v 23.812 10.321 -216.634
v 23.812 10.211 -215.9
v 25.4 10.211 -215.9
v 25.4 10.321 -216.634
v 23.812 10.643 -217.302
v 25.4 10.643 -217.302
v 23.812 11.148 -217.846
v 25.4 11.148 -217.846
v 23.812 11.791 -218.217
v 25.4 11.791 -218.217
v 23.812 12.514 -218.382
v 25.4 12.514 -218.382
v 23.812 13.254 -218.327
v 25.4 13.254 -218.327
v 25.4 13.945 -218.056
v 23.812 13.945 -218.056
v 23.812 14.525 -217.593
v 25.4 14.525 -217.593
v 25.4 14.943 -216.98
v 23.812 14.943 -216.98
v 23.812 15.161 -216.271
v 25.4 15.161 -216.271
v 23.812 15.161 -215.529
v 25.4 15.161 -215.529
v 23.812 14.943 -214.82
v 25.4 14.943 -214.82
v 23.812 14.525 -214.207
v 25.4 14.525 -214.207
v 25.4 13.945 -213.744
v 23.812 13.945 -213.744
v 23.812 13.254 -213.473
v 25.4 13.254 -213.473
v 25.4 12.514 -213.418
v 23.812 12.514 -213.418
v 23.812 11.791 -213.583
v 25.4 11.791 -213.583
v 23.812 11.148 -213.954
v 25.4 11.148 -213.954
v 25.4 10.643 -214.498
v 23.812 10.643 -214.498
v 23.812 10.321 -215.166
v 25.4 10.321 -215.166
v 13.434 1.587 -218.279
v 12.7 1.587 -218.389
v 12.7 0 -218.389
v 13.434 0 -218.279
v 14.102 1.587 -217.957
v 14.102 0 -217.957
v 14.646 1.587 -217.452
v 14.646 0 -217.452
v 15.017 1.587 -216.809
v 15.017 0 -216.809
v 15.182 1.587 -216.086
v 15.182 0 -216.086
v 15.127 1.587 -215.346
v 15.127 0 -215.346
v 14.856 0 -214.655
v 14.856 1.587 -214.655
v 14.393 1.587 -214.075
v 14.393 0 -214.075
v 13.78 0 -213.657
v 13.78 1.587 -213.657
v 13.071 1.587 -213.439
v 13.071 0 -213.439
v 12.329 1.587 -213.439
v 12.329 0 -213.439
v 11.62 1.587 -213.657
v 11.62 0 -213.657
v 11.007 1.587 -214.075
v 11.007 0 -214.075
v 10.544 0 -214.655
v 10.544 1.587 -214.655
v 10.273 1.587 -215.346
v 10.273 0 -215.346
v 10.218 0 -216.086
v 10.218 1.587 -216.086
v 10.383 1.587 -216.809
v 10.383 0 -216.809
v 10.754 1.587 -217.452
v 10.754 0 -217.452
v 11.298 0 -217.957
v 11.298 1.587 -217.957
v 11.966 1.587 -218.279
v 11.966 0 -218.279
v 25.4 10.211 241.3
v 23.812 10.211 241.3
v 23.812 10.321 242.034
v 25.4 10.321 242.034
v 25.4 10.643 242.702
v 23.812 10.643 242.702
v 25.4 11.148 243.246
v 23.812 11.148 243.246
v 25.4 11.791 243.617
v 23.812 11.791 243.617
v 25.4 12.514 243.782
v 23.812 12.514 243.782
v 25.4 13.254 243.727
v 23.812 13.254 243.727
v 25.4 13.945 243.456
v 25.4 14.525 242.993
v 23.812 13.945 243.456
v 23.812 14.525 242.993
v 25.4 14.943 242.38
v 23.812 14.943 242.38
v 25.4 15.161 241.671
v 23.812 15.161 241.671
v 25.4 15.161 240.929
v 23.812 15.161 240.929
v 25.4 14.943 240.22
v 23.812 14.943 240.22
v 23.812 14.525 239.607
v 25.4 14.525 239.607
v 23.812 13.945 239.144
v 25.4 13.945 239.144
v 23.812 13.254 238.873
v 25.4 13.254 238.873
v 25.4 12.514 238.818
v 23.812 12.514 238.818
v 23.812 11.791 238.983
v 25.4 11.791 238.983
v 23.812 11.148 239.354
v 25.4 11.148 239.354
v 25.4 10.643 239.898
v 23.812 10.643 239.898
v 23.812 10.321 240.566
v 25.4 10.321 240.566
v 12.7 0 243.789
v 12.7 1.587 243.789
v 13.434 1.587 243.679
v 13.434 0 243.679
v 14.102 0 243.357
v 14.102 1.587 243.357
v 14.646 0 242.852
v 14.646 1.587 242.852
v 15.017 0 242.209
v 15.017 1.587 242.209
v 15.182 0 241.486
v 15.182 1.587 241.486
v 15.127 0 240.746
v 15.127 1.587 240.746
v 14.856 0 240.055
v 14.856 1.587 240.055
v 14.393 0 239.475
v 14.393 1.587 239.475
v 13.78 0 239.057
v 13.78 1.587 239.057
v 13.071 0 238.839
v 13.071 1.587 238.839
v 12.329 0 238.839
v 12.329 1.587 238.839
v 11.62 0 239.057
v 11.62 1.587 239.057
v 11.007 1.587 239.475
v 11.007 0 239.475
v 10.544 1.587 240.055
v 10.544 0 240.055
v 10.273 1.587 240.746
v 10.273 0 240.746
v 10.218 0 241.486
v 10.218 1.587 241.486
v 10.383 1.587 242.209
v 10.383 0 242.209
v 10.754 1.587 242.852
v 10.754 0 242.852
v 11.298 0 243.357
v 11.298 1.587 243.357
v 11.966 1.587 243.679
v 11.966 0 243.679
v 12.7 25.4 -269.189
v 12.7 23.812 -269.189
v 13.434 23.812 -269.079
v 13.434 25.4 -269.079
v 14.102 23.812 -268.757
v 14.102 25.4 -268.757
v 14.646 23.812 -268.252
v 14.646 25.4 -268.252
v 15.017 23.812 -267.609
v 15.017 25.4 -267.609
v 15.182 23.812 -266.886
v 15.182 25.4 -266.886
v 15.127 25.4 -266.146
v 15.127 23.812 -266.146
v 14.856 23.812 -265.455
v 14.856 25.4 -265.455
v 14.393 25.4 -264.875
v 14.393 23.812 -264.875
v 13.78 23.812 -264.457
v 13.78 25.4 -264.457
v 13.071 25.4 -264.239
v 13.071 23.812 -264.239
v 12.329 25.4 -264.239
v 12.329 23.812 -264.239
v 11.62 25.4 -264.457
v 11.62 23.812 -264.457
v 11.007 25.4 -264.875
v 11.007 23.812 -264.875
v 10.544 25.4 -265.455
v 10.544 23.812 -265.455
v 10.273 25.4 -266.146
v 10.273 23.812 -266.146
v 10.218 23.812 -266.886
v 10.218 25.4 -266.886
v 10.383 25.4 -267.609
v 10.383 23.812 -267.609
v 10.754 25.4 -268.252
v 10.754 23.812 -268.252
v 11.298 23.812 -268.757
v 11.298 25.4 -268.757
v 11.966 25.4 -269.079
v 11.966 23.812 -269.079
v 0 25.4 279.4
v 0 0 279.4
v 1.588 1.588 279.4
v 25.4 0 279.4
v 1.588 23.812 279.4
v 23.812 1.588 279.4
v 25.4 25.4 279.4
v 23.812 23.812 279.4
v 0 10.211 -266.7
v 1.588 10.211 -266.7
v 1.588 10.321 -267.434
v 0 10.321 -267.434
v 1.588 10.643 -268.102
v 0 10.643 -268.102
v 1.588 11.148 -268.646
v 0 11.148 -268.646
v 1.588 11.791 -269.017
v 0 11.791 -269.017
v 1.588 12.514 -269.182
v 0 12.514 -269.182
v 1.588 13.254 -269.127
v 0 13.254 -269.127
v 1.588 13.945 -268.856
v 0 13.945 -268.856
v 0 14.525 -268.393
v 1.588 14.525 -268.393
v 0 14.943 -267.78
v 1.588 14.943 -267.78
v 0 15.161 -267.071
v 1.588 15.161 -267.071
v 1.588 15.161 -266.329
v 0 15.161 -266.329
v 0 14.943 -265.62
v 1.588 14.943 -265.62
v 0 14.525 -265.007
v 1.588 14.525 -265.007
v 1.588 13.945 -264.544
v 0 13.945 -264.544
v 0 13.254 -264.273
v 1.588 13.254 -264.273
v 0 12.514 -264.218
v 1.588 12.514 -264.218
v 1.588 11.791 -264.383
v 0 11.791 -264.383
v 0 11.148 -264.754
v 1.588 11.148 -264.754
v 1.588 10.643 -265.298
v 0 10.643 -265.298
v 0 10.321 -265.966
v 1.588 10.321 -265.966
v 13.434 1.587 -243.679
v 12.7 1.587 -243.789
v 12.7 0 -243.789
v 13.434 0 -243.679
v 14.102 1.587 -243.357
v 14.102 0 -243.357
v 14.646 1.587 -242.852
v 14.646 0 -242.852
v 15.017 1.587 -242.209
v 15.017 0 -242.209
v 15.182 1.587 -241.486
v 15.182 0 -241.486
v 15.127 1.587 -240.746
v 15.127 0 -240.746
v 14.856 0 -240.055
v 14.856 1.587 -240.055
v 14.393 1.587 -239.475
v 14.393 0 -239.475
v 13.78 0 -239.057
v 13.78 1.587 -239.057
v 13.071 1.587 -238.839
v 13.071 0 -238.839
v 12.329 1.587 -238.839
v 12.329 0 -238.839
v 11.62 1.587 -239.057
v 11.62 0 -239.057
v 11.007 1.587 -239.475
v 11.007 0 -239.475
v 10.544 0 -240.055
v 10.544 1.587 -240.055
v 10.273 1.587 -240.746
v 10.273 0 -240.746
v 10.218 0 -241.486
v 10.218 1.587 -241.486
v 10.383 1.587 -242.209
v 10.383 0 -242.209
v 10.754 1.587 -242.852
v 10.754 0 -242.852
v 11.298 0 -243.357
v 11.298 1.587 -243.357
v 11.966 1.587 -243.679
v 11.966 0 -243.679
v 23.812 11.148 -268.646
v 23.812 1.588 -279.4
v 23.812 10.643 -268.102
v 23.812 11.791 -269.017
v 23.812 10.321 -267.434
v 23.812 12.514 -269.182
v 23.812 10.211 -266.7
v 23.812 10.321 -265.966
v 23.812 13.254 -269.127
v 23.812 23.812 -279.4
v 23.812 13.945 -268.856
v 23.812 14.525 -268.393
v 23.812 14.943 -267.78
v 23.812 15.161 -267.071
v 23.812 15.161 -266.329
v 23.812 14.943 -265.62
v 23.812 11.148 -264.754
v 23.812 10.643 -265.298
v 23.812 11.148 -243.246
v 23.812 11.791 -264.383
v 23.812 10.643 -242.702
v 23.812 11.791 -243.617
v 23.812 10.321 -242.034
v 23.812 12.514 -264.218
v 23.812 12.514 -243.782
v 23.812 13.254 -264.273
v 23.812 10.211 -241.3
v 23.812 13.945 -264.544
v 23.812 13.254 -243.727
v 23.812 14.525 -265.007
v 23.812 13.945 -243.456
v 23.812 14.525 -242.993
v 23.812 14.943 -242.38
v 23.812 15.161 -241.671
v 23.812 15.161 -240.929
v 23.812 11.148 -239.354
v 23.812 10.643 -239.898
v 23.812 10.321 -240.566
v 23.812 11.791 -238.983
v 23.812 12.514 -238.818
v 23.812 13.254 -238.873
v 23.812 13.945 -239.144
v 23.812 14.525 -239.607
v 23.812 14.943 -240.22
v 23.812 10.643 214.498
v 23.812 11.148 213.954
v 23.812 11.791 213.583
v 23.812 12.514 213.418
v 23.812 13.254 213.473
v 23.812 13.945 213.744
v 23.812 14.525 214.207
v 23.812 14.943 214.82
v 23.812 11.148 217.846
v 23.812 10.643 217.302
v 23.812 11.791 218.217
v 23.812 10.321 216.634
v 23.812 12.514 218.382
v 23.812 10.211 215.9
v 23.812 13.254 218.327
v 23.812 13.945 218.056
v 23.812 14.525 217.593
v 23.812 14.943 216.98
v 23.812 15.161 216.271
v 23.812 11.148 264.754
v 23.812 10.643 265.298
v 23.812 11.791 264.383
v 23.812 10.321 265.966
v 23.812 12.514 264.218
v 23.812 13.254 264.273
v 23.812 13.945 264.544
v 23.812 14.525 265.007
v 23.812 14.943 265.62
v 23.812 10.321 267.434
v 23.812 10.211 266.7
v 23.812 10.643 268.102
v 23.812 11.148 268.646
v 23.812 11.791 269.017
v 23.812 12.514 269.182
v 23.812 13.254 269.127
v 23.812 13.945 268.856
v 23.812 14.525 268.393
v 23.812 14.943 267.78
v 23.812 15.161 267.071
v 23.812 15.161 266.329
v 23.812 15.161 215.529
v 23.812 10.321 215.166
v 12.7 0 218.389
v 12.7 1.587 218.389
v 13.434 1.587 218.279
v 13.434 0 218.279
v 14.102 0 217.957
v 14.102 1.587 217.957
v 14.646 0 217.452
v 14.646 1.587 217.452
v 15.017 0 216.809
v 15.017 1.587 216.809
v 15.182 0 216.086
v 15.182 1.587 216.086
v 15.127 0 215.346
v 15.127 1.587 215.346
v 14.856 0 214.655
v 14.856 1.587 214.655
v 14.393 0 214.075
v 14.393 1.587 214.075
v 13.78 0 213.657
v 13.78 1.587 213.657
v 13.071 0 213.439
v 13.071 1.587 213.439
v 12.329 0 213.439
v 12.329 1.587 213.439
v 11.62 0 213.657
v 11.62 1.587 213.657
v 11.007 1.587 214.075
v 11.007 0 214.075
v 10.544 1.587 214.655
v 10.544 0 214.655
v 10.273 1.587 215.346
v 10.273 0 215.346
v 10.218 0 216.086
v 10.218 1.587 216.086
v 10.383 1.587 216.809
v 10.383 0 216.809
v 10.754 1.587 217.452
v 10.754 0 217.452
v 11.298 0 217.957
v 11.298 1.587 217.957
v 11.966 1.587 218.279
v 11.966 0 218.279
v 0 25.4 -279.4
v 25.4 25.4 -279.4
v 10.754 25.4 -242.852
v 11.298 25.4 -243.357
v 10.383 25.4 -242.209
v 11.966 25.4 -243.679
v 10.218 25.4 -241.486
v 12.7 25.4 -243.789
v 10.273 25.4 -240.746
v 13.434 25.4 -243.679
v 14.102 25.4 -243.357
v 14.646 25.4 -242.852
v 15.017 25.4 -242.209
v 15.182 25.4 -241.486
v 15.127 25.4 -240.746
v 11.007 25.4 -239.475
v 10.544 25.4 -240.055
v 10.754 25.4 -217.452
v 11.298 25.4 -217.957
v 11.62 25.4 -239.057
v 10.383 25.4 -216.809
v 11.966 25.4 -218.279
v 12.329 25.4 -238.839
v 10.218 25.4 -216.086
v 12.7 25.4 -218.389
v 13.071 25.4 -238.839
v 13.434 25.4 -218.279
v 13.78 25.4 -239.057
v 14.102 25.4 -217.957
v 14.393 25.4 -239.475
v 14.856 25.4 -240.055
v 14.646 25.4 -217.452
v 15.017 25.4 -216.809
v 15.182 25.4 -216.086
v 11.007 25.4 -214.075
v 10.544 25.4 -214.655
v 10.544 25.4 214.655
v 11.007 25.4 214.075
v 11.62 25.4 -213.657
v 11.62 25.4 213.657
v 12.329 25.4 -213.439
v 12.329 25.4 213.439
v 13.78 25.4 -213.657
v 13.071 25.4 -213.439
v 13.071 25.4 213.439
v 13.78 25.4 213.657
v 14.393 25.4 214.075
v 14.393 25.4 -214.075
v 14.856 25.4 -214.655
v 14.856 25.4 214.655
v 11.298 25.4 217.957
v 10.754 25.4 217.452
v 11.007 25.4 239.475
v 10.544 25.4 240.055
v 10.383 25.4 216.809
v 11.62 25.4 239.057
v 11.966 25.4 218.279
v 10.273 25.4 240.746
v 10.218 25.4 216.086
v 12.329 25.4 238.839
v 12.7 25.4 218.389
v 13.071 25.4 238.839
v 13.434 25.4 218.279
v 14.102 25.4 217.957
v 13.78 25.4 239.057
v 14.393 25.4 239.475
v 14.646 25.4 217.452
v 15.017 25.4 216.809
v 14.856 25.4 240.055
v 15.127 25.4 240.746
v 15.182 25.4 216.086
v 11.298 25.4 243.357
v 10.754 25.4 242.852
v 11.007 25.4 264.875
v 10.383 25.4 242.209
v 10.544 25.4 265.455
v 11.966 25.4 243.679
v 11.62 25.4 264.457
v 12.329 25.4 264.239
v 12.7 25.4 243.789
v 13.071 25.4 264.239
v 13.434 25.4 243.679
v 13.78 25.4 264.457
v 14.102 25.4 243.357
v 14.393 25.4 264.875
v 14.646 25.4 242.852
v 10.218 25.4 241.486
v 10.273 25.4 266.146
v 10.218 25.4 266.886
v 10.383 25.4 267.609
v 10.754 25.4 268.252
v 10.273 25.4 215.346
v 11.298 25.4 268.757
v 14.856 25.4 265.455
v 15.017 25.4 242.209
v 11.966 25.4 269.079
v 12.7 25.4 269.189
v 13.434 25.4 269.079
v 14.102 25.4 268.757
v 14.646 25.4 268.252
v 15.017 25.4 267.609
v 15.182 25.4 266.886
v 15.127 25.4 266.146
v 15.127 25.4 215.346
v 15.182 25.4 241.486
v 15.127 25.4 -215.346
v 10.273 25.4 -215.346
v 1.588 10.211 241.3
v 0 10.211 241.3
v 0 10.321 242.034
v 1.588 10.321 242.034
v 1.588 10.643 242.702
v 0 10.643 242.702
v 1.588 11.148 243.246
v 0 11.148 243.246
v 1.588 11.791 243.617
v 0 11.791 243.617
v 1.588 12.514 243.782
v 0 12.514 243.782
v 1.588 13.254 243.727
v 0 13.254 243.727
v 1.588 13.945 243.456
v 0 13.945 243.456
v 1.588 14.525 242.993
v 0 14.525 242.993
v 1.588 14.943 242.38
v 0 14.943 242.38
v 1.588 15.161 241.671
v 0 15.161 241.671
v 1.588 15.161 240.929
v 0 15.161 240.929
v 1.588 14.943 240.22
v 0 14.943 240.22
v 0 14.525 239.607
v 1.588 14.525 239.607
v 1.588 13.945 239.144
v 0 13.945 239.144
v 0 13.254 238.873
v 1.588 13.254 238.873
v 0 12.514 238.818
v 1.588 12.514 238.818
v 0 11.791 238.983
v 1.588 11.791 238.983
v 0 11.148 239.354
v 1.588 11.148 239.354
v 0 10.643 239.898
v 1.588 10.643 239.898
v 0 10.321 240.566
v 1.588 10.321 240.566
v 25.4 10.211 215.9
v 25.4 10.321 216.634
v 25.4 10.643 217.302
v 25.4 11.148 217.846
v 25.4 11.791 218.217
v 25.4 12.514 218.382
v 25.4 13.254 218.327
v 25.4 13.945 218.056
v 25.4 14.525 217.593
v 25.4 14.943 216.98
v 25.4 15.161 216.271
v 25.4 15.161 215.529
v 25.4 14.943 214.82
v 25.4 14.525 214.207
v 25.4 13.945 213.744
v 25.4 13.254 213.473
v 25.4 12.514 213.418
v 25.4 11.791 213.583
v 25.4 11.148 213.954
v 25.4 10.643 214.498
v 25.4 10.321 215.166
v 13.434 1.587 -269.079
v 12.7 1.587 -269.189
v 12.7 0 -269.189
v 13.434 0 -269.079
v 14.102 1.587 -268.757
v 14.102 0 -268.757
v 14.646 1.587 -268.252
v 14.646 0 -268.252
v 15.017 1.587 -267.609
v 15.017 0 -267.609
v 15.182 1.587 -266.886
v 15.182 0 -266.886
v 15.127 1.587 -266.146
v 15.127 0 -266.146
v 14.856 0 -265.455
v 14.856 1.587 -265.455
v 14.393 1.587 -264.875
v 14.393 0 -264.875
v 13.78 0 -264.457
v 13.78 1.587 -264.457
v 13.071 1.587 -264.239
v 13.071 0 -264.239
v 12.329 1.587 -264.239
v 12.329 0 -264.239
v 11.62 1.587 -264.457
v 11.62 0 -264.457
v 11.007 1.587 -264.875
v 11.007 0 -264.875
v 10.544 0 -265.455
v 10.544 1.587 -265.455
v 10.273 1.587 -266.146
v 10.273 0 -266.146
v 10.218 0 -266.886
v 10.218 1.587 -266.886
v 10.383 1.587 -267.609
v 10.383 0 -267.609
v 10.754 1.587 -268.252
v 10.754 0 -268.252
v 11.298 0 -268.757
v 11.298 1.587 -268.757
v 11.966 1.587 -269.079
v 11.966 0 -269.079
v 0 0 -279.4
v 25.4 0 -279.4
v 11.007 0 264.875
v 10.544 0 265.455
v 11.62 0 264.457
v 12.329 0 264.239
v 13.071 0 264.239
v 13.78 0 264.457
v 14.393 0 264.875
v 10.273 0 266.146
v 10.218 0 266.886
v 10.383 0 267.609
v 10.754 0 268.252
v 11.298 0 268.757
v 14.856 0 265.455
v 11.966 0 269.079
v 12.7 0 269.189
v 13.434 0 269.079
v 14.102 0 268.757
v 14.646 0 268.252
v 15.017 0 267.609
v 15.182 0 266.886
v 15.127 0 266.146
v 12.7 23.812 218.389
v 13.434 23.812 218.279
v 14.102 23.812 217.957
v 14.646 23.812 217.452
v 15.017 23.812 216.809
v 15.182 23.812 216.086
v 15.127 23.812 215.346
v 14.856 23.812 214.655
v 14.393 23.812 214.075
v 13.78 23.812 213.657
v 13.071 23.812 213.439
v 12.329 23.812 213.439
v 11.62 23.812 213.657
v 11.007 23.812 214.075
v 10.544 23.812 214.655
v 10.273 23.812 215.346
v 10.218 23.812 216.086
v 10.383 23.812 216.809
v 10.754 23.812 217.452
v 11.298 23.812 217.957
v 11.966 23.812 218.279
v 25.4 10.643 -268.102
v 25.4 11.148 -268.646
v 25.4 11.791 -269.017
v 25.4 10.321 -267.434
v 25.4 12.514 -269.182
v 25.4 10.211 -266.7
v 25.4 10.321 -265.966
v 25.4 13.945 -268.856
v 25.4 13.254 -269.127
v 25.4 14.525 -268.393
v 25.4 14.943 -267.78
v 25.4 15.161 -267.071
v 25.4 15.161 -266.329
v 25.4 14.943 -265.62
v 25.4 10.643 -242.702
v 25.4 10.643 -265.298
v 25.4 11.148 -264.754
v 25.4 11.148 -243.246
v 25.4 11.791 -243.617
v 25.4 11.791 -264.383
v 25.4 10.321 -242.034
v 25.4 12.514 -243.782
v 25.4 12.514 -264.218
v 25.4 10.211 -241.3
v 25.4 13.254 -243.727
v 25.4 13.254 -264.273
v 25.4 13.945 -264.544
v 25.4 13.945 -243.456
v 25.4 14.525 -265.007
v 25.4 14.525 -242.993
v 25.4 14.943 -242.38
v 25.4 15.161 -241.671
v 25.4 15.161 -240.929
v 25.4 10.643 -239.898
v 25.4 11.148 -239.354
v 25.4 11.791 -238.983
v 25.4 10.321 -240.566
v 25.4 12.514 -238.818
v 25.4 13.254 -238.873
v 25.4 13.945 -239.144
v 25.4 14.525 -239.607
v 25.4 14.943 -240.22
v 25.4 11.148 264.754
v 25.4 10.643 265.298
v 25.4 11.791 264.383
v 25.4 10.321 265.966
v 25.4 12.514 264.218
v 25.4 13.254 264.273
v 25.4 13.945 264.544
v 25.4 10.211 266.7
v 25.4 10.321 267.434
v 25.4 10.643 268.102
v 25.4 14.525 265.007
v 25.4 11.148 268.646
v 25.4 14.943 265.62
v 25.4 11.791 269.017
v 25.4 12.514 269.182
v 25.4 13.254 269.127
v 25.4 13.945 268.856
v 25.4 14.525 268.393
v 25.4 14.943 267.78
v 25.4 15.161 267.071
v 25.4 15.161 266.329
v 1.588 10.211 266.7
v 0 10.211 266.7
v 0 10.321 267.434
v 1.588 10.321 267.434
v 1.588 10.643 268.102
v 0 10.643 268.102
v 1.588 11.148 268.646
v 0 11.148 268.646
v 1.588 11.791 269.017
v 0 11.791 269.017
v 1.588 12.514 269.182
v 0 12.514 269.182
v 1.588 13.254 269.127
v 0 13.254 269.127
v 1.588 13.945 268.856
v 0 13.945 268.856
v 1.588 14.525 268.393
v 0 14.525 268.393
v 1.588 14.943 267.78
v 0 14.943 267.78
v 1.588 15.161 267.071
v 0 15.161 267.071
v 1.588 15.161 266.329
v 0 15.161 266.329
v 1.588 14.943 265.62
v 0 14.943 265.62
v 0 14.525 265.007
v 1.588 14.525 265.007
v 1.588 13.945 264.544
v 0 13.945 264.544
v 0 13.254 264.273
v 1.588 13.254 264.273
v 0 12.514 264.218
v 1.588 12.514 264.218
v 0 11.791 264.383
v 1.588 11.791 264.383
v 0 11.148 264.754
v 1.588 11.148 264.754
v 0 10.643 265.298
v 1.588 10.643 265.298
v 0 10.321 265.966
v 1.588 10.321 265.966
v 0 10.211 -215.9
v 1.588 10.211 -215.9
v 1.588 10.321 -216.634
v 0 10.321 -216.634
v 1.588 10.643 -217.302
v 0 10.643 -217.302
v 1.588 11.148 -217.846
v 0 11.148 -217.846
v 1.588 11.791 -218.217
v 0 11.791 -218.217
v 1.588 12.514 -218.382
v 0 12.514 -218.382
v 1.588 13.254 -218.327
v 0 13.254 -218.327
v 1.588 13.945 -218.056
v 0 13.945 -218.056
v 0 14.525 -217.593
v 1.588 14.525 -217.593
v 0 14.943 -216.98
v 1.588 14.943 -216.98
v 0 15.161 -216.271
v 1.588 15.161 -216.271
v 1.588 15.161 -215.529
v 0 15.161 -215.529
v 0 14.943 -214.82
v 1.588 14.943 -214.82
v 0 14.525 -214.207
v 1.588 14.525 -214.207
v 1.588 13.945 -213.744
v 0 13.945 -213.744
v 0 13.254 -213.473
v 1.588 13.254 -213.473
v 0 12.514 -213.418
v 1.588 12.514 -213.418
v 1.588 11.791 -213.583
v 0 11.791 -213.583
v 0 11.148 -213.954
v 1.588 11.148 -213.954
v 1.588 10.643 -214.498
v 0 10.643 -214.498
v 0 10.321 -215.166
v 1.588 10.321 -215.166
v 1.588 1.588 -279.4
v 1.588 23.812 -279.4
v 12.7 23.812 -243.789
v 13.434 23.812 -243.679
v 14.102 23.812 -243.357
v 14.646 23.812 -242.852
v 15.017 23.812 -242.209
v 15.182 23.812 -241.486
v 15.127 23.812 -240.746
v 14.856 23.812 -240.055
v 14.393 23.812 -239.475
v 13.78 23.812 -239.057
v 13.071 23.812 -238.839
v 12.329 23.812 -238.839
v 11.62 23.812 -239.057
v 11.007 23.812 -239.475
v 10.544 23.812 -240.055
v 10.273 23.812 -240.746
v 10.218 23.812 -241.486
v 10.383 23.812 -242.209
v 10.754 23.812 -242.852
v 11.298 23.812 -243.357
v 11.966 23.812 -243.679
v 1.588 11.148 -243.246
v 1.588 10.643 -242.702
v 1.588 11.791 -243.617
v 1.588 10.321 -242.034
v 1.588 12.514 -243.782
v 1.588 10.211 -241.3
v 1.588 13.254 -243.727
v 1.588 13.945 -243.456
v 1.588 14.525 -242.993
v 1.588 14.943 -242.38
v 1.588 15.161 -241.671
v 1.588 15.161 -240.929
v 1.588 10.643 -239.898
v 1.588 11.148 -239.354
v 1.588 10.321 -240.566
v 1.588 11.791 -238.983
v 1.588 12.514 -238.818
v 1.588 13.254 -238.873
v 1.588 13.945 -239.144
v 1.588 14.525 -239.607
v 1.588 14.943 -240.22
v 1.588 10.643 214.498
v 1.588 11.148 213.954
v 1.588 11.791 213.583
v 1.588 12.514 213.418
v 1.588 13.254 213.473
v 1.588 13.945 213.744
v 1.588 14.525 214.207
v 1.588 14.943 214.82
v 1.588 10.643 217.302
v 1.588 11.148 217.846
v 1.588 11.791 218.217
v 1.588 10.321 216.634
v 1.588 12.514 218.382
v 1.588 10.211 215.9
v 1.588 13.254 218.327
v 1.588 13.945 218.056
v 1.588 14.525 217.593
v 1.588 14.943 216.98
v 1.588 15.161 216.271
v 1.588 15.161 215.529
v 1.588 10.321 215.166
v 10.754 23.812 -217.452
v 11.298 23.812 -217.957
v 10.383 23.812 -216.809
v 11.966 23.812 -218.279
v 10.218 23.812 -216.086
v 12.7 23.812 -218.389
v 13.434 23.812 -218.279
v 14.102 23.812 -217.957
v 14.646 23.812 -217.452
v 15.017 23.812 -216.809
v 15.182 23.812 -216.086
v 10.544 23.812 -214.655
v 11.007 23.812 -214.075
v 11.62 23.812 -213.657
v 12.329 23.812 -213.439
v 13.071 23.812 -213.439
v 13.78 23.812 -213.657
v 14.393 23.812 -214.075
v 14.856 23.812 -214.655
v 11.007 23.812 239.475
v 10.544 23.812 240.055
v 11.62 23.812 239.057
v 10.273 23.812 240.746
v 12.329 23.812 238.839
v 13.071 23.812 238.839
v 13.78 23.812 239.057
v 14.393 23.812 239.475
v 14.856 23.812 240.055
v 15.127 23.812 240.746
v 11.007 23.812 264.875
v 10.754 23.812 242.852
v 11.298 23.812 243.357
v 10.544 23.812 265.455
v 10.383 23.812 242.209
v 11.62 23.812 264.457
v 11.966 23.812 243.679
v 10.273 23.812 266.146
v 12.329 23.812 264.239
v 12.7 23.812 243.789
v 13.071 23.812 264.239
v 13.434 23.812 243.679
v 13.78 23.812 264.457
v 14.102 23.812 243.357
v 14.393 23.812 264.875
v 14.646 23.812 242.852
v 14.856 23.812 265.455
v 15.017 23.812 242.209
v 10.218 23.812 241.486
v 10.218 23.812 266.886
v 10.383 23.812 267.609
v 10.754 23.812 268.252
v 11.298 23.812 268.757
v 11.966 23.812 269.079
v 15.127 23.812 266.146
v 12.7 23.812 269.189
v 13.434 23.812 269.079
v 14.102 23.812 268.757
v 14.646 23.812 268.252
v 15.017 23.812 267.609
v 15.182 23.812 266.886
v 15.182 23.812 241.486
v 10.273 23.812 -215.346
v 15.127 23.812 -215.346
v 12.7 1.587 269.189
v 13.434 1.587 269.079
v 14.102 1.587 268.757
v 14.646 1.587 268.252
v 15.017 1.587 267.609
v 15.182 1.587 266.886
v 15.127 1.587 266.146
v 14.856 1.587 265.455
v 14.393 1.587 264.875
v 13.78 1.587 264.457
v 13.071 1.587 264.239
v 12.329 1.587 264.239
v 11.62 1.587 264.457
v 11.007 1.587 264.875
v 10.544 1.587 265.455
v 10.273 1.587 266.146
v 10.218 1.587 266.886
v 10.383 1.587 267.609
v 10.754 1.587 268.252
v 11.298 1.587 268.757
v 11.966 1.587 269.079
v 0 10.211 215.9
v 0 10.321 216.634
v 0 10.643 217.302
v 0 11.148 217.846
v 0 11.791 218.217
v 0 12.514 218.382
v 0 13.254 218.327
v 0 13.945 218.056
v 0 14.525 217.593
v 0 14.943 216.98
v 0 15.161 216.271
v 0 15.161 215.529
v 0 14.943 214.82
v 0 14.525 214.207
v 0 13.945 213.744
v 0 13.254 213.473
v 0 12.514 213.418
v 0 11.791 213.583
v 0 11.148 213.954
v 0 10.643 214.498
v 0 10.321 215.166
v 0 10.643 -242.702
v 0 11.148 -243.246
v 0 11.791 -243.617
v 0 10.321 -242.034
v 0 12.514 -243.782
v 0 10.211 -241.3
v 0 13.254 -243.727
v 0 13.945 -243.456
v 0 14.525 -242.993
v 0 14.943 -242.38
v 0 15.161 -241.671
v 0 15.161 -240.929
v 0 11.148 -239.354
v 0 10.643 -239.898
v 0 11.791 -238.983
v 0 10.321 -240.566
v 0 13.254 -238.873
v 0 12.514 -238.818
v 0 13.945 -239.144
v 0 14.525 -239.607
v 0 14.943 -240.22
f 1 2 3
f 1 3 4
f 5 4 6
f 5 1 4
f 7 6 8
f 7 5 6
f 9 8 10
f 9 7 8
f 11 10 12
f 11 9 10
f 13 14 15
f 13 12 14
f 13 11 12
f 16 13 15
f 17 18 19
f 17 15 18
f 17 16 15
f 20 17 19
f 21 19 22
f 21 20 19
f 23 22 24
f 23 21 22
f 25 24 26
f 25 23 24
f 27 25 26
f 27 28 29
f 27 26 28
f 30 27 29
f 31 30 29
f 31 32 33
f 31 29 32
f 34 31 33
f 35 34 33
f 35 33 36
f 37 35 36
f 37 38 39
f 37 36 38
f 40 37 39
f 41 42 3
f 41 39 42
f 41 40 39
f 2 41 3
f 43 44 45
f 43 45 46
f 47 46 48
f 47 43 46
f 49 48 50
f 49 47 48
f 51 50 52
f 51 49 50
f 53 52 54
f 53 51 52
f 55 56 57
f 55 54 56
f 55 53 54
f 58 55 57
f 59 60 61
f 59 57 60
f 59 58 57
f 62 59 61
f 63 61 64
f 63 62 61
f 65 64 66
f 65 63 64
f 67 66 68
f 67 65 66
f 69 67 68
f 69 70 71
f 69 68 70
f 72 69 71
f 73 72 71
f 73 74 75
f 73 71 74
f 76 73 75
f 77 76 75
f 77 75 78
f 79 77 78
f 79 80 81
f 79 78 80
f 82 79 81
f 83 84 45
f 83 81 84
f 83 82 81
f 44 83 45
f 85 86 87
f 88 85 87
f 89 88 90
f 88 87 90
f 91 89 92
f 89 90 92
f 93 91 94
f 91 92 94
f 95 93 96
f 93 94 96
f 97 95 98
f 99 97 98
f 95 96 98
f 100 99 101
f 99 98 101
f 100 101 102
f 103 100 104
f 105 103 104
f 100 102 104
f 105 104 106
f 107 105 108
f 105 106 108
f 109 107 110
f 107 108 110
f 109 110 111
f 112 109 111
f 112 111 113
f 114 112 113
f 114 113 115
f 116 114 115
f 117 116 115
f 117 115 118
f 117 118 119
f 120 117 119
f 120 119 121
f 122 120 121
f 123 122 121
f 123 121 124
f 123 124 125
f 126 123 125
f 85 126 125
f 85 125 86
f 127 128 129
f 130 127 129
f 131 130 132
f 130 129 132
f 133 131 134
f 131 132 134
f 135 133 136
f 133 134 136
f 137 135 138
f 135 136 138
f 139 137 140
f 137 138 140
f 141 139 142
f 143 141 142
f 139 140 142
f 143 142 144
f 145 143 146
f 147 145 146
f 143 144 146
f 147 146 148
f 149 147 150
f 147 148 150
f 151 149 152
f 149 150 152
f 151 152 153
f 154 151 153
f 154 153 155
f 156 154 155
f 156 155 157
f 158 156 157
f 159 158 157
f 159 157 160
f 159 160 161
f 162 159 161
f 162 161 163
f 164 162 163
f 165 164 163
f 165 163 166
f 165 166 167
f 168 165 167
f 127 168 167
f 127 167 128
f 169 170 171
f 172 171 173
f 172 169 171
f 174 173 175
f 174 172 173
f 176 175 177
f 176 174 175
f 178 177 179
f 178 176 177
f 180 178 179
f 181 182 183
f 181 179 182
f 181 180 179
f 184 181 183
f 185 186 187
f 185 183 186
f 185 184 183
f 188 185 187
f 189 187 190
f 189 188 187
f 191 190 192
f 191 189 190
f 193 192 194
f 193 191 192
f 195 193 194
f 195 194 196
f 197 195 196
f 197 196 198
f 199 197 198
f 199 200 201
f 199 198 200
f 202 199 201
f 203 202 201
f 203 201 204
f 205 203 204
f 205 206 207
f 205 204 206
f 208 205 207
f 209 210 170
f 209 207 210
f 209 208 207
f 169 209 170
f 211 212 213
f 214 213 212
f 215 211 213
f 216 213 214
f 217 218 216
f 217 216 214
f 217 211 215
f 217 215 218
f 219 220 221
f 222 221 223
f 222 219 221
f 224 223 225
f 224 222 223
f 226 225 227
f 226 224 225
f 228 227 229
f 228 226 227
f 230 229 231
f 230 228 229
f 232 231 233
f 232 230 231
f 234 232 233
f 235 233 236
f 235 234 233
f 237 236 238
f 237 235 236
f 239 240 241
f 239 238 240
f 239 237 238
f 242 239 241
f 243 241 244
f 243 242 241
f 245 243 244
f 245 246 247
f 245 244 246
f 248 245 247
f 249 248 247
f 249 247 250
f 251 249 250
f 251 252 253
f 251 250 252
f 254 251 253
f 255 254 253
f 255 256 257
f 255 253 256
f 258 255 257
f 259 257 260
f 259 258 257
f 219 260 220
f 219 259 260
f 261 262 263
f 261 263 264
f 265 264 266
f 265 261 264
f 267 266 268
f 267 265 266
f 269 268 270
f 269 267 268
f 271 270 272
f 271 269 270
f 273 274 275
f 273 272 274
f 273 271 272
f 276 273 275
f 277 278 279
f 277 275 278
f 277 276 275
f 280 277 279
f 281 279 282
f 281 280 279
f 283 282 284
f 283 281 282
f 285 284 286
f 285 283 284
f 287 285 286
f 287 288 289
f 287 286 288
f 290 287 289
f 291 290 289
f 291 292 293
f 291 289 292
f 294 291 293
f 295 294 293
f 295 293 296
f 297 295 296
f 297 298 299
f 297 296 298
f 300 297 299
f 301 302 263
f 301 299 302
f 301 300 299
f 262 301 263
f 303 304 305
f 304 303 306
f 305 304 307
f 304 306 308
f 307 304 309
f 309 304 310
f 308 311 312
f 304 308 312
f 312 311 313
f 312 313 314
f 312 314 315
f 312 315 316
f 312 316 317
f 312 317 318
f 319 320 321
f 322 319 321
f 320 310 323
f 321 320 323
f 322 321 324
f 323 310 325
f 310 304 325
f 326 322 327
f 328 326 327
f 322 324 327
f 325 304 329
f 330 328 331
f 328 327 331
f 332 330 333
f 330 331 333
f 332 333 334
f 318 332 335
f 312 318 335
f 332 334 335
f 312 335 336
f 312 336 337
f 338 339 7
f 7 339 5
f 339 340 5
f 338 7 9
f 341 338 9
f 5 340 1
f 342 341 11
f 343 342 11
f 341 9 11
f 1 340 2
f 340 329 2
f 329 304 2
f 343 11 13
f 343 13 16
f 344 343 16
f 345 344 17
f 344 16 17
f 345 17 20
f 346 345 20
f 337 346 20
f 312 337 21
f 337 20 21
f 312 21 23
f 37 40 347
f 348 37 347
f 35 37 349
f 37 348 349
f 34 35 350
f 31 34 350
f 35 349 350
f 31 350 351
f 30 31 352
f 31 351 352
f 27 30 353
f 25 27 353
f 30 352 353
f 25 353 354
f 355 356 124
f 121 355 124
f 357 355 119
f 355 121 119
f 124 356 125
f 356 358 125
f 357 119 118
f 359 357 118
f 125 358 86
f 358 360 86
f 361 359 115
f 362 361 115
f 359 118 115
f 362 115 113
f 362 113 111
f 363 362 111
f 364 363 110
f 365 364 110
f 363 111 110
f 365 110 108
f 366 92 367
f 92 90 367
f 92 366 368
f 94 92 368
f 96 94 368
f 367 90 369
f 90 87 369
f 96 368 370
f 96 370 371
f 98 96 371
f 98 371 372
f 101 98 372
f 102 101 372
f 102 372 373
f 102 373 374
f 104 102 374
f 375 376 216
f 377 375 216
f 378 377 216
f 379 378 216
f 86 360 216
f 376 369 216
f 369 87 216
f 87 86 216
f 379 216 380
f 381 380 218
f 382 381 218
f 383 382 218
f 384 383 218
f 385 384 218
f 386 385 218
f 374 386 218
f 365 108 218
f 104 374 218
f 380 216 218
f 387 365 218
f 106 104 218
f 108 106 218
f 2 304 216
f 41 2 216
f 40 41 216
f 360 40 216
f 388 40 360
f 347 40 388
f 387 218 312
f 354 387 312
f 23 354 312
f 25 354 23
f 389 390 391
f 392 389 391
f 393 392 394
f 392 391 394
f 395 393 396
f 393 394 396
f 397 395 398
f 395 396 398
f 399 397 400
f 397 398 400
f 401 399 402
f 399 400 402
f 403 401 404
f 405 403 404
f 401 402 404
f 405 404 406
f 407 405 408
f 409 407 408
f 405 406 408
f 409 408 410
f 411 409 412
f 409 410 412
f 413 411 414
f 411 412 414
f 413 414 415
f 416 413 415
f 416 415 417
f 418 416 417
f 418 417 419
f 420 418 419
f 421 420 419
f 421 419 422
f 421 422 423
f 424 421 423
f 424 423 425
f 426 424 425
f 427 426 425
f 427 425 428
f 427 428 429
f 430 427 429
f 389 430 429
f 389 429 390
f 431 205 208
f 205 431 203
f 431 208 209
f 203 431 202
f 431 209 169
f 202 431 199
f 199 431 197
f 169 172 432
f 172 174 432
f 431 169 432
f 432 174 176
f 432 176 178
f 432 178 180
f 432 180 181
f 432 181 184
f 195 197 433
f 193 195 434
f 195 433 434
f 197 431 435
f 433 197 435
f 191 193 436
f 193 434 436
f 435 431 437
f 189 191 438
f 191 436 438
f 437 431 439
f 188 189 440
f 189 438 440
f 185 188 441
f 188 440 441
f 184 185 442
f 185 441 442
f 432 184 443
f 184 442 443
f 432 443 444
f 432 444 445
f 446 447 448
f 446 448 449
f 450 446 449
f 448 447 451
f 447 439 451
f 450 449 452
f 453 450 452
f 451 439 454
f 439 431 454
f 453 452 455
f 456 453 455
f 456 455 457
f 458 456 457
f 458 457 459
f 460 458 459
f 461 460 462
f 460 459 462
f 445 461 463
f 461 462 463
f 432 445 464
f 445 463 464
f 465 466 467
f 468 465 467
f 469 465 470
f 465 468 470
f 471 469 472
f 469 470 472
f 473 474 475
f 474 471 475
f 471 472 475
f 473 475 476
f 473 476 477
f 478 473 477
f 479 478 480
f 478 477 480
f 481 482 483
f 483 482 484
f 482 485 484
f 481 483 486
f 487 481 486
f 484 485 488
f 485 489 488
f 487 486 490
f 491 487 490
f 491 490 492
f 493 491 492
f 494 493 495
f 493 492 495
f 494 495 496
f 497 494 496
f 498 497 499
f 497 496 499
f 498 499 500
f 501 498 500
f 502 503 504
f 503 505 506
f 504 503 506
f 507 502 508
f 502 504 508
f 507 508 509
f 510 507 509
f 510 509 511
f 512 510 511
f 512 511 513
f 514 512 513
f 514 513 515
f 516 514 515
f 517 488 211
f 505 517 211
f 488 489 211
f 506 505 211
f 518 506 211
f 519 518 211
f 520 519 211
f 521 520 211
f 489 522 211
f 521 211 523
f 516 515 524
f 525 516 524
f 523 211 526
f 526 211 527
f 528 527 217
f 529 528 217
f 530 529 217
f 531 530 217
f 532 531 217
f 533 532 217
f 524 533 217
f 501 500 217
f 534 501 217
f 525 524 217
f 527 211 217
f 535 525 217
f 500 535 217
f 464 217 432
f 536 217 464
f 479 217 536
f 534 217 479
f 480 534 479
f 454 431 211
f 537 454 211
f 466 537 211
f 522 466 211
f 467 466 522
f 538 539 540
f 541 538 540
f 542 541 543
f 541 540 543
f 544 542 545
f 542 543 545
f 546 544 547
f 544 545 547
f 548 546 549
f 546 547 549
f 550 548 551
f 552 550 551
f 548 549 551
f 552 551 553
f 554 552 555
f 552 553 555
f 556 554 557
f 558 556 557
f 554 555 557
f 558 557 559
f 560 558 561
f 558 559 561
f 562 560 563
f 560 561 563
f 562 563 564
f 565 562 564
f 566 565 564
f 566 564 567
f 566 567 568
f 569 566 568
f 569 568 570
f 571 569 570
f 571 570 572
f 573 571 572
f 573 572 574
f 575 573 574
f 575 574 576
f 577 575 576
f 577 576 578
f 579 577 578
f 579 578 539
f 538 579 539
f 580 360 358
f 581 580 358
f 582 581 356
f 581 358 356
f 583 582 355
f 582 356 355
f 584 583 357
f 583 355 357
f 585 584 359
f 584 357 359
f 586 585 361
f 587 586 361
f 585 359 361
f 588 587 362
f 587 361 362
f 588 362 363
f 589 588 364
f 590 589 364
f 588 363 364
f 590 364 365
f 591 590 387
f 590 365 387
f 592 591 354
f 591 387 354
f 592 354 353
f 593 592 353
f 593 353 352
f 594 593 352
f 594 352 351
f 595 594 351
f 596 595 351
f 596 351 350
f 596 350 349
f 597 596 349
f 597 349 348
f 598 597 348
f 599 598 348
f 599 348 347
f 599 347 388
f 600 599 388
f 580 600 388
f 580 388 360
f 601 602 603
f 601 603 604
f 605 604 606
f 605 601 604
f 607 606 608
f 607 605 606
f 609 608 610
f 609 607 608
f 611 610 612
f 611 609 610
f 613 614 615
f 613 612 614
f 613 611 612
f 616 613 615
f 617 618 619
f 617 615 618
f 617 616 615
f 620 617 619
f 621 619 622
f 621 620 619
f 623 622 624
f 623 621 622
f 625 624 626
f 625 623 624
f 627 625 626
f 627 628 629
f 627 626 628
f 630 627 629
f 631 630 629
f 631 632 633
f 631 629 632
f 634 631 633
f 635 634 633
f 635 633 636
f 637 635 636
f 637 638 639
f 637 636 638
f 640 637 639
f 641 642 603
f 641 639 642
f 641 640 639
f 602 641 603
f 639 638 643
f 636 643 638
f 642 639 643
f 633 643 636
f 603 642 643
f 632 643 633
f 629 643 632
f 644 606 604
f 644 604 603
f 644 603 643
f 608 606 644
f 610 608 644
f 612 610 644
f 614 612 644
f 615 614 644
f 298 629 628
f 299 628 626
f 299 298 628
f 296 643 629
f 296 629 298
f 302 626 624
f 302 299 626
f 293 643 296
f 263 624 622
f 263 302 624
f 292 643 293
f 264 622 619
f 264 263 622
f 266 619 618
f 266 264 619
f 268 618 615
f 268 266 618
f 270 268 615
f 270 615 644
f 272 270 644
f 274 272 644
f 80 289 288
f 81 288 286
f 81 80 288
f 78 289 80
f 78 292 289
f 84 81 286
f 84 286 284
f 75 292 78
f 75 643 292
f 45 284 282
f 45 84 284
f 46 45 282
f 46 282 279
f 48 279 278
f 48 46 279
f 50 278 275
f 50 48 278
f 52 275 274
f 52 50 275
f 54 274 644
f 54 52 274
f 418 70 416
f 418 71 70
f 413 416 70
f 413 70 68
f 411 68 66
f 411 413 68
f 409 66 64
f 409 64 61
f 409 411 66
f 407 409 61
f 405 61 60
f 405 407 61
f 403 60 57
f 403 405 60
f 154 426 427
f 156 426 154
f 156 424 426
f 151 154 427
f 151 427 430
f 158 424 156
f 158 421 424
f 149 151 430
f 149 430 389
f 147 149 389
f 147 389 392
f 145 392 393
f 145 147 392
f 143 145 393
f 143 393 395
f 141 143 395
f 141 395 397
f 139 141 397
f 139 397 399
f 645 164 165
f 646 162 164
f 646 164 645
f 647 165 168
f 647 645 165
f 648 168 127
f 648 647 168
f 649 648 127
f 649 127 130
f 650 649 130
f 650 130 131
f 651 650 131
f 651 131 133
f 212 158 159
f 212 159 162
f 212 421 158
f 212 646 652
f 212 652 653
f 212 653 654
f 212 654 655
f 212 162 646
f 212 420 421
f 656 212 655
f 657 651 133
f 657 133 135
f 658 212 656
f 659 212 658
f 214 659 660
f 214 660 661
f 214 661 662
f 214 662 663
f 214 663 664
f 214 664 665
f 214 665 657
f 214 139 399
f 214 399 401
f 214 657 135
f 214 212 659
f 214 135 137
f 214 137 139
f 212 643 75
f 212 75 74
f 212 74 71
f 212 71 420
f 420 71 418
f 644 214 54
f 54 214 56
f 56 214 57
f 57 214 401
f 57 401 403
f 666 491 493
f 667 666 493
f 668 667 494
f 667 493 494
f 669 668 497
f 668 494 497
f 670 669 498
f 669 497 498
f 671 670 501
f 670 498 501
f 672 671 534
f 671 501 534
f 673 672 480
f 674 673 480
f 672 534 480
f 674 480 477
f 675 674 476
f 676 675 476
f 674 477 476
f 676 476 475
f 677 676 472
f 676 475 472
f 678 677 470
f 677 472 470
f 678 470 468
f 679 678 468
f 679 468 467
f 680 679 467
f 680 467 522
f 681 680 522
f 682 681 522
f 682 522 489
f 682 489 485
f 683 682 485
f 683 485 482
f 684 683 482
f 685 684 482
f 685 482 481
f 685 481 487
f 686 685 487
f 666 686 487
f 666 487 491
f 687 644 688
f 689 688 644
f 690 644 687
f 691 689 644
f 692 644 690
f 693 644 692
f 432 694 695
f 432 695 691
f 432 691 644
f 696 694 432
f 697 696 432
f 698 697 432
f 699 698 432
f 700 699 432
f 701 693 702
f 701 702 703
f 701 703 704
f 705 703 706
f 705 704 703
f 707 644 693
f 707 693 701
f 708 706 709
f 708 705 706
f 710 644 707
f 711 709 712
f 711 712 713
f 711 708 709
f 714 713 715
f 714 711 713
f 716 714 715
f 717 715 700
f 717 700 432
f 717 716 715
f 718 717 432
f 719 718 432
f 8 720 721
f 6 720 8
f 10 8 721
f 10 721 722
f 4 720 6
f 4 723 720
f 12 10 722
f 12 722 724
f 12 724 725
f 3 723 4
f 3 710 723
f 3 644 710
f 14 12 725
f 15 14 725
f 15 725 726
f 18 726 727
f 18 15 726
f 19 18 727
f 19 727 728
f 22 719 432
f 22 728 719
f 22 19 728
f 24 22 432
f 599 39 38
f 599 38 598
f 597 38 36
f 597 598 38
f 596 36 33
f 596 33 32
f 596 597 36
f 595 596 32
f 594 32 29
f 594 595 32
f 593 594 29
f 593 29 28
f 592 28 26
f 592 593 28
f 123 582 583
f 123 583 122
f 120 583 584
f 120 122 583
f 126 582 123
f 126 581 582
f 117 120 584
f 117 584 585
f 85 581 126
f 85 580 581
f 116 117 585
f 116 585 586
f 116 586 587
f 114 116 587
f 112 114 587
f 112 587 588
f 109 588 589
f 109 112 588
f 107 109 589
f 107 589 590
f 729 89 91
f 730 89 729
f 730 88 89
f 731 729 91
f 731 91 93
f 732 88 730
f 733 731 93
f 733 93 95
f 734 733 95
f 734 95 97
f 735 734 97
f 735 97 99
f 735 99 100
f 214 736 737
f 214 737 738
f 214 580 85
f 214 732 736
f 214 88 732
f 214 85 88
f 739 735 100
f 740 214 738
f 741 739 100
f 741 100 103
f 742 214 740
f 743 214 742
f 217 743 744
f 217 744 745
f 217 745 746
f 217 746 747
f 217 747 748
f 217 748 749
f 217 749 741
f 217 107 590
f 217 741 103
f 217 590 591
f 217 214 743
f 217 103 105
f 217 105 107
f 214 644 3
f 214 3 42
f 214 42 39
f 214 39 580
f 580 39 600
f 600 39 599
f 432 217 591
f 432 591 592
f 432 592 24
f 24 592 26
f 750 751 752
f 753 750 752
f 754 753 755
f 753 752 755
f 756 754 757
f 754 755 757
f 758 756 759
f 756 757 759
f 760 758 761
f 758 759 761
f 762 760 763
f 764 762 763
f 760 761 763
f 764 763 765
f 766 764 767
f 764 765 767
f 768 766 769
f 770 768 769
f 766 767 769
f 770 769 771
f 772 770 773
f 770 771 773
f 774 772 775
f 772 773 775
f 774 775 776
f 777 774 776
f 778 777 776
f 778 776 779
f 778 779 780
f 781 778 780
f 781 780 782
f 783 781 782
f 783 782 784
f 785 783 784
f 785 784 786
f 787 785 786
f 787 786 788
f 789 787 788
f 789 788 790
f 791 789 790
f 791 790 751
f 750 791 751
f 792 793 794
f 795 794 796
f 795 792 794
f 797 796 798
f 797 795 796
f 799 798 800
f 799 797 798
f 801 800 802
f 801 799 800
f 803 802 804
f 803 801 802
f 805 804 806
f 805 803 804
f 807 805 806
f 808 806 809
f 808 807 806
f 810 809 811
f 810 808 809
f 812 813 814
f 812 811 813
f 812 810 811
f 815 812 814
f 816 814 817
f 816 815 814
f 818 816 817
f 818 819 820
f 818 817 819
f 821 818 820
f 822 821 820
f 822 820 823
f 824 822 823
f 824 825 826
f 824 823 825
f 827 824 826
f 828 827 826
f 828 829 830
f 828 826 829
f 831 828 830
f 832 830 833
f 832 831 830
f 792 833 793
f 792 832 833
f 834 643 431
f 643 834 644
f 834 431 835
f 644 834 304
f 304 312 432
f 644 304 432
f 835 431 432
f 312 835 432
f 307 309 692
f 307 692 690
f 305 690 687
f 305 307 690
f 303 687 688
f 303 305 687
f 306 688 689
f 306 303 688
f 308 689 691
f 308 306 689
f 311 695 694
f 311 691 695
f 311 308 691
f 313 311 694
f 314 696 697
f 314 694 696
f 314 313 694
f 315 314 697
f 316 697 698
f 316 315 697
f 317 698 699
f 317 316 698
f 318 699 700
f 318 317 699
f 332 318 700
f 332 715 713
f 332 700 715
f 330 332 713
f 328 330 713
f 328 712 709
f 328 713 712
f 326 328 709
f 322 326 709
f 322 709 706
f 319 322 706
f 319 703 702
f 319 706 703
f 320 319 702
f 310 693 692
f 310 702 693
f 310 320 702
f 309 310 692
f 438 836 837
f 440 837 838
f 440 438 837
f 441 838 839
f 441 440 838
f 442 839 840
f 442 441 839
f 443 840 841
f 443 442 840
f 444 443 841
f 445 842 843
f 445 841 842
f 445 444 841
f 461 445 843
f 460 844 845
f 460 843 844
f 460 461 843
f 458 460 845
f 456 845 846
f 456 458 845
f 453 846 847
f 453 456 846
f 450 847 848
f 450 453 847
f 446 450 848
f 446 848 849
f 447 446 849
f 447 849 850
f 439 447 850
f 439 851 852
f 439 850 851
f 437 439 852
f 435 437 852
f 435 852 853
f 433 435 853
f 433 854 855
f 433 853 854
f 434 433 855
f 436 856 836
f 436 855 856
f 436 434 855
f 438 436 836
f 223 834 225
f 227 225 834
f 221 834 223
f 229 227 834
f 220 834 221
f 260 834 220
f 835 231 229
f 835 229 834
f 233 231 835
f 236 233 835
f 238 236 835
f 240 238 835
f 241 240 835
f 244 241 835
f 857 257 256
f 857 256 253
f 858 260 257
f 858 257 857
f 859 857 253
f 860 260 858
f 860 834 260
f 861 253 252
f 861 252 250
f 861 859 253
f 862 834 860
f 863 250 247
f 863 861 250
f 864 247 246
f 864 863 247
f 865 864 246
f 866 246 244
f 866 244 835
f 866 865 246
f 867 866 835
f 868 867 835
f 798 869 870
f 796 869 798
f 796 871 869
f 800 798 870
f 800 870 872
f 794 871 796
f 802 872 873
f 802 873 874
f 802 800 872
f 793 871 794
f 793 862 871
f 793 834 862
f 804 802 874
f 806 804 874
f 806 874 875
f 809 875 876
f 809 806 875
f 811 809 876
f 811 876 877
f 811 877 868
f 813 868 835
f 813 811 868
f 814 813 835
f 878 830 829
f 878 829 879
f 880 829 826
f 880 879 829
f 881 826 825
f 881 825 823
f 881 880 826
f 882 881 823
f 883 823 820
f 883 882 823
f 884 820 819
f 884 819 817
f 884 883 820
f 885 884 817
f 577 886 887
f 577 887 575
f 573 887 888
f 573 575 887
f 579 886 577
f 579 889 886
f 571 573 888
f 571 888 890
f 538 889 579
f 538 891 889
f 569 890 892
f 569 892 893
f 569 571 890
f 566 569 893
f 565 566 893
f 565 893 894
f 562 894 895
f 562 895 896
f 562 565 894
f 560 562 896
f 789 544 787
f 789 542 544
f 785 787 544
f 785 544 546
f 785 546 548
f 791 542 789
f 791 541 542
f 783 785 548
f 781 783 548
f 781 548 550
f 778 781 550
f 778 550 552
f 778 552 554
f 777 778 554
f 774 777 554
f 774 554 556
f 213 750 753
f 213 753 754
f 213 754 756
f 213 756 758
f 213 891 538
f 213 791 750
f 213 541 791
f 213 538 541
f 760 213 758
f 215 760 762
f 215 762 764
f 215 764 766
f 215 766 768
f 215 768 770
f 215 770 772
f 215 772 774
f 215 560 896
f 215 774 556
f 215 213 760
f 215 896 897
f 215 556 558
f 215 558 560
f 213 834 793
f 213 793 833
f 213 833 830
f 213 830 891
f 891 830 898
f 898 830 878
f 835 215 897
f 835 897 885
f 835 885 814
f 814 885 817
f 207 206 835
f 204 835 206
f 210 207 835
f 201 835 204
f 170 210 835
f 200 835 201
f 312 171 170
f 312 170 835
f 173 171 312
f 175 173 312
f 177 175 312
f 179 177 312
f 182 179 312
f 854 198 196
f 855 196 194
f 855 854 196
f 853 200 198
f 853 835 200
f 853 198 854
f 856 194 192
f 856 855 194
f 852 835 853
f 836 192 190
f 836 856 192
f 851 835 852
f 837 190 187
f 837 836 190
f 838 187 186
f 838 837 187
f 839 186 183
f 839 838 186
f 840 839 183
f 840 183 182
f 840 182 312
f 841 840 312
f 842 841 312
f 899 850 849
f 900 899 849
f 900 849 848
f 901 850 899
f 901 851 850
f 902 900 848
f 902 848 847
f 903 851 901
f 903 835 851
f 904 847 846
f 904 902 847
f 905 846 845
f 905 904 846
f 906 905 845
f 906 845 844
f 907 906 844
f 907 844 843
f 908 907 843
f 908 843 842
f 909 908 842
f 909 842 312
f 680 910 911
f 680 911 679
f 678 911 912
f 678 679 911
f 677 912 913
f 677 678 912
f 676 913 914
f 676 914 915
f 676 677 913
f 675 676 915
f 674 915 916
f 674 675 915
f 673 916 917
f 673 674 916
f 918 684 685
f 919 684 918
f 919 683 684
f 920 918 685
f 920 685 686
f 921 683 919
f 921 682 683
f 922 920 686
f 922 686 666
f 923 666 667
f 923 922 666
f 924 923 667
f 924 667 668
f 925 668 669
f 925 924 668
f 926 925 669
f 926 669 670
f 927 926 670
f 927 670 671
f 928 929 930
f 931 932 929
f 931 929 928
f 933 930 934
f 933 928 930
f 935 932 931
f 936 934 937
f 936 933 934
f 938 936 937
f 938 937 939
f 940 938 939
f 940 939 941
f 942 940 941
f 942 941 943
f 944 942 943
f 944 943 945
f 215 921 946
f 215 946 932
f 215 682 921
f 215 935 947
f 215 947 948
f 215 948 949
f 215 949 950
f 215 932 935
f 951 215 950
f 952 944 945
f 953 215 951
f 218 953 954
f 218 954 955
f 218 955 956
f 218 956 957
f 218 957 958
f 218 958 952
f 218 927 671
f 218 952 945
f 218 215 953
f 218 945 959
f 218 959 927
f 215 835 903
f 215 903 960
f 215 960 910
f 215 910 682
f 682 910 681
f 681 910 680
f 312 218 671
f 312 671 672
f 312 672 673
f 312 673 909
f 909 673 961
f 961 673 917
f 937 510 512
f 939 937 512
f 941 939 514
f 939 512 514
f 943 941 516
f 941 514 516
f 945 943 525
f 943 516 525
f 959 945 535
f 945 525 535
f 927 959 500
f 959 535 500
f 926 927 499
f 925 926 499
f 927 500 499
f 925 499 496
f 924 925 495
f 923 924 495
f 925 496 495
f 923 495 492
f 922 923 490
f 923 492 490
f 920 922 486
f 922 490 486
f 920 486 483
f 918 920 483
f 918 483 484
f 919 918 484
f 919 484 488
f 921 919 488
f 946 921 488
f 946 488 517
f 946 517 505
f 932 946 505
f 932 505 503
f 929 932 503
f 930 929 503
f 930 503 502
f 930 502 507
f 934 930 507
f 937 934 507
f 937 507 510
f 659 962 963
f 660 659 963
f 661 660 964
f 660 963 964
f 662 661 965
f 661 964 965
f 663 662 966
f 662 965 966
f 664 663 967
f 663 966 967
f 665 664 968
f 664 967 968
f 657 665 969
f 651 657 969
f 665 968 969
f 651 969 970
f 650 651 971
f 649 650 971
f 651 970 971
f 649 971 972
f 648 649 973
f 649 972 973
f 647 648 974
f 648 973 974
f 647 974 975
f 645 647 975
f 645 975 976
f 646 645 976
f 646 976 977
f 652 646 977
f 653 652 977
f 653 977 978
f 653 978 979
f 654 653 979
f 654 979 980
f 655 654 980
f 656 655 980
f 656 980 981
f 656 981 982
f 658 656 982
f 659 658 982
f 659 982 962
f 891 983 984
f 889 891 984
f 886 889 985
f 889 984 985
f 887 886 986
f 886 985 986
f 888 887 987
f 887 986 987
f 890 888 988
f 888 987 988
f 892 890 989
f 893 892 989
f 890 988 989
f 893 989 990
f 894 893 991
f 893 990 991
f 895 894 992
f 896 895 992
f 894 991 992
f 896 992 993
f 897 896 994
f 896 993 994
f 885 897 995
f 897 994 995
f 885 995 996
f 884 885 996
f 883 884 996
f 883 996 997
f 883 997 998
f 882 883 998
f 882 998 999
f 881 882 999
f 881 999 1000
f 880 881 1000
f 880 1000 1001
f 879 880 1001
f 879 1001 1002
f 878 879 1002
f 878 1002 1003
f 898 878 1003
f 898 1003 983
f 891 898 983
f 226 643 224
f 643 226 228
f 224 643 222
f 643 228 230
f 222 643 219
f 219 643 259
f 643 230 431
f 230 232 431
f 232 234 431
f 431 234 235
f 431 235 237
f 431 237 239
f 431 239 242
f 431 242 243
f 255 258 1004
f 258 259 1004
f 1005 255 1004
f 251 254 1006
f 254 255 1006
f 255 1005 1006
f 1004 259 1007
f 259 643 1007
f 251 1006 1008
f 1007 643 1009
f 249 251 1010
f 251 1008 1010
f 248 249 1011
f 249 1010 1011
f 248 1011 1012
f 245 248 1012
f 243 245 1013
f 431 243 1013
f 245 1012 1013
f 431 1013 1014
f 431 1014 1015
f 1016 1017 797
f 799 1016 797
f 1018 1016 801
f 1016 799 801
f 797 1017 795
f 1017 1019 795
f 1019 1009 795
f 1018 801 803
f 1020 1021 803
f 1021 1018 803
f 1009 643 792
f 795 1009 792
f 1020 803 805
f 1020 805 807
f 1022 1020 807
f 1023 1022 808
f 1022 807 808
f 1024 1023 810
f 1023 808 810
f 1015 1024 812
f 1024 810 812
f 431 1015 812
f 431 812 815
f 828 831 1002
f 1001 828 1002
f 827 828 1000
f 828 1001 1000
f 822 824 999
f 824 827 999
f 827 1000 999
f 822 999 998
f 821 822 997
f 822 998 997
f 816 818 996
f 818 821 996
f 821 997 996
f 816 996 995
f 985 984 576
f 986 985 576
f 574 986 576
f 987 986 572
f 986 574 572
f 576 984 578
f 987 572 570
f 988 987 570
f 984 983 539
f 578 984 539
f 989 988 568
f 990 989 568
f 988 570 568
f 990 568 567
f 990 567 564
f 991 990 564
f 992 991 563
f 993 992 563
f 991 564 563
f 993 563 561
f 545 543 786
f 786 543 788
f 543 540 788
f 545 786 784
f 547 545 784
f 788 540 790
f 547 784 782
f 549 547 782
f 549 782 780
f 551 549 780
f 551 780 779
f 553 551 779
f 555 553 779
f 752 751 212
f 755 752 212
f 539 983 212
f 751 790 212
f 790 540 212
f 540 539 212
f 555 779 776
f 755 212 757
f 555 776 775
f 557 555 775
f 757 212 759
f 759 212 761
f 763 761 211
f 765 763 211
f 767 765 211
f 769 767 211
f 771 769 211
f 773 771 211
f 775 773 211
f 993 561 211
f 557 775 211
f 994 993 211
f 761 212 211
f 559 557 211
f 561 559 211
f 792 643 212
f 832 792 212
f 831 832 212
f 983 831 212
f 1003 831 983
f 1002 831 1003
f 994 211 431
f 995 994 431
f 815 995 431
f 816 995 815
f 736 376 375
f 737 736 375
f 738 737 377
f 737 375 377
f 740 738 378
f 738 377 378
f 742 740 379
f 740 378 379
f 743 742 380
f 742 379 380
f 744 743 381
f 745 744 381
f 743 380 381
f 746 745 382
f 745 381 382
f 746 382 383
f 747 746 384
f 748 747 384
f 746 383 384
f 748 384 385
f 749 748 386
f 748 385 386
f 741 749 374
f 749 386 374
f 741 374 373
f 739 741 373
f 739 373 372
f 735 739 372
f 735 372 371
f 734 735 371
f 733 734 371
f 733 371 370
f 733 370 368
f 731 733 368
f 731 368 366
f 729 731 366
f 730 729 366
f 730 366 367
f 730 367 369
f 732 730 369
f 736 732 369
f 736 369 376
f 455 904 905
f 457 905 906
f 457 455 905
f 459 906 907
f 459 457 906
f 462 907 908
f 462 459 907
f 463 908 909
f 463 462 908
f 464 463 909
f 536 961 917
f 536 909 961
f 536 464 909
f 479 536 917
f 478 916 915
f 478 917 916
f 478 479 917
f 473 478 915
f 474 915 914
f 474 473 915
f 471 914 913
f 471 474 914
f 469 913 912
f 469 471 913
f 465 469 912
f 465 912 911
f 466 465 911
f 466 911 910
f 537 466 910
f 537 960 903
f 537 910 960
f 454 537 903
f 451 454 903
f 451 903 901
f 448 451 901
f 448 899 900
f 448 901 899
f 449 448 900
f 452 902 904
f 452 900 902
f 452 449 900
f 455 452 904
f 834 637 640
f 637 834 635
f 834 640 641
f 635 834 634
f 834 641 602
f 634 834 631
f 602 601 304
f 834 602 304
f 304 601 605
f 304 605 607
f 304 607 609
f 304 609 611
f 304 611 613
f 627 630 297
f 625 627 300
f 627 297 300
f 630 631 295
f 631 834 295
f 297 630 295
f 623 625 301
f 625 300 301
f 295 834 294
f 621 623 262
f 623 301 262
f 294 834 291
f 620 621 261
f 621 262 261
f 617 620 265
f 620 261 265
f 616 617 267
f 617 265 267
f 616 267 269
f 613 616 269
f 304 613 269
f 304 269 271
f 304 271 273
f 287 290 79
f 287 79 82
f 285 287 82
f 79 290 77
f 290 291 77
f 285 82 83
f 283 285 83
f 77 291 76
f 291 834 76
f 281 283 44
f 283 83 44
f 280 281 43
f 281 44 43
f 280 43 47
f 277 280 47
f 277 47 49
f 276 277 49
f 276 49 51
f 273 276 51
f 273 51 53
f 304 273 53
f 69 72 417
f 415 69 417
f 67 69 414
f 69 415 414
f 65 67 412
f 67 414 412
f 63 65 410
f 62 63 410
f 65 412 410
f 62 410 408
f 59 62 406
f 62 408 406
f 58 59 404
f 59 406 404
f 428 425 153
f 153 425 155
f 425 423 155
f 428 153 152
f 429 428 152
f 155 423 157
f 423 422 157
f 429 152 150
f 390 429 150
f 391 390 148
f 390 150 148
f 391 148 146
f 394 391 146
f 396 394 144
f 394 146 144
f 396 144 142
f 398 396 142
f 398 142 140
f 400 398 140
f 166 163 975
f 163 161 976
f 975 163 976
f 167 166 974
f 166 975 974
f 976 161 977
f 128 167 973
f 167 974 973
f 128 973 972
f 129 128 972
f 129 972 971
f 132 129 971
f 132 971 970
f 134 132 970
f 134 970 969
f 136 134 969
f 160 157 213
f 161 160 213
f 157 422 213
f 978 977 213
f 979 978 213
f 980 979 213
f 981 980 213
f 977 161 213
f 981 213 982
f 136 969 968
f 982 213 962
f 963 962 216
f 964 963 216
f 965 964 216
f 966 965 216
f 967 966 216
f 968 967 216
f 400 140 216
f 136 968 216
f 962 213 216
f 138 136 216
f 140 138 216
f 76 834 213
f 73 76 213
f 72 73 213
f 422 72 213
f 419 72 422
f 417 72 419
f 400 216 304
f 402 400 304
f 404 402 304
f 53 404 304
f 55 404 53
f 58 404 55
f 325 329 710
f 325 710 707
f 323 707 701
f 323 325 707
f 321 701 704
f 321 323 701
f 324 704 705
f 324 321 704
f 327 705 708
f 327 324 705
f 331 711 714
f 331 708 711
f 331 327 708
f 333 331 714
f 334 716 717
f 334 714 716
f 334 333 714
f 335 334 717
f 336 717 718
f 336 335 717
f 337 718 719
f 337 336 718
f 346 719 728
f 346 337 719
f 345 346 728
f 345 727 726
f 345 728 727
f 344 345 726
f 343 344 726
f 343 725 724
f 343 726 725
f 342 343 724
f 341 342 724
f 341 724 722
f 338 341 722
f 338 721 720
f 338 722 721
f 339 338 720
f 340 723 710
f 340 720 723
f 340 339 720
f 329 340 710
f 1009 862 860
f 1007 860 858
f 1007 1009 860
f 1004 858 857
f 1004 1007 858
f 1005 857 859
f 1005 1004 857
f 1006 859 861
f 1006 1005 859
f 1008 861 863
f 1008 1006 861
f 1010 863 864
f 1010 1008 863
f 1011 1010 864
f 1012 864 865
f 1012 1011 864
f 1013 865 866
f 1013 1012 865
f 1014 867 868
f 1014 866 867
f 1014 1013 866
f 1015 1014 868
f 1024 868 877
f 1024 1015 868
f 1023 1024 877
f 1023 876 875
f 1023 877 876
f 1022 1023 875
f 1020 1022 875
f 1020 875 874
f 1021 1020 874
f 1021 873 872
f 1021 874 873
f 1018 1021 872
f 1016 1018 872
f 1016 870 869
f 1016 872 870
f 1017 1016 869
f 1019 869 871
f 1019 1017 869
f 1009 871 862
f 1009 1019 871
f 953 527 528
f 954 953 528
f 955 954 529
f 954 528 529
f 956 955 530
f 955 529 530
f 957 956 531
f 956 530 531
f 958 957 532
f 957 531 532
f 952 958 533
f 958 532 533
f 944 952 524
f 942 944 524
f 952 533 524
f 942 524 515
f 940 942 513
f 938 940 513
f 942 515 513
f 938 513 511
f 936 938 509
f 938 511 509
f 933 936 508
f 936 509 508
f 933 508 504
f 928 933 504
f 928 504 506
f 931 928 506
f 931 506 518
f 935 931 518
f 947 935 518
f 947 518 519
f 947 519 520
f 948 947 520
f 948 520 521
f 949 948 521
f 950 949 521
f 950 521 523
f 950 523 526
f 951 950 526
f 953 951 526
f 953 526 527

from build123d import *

# Parameters (mm, degrees)
SKETCH1_W           = 25.4
SKETCH1_H           = 25.4
BOSS_EXTRUDE1_DEPTH = 279.4
SHELL1_T            = -1.5875
SKETCH2_R           = 2.4892
CUT_EXTRUDE1_DEPTH  = 282.699627263
SKETCH3_R           = 2.4892
CUT_EXTRUDE2_DEPTH  = 282.699627263


with BuildPart() as part:
    # Sketch1 → Boss-Extrude1 (new, symmetric)
    with BuildSketch(Plane.XY):
        with Locations((12.7, 12.7)):
            Rectangle(SKETCH1_W, SKETCH1_H)
    extrude(amount=BOSS_EXTRUDE1_DEPTH, both=True)

    # Shell1
    shell1_openings = [part.faces().sort_by_distance(p)[0] for p in [
        (12.7, 12.7, 279.4),
        (12.7, 12.7, -279.4),
    ]]
    offset(amount=SHELL1_T, openings=shell1_openings, kind=Kind.INTERSECTION)

    # Sketch2 → Cut-Extrude1 (cut, through all)
    with BuildSketch(Plane(origin=(0, 25.4, 0), x_dir=(1, 0, 0), z_dir=(0, 1, 0))):
        with Locations(Location((12.7, -266.7, 0), (0, 0, 270))):
            Circle(SKETCH2_R)
        with Locations(Location((12.7, -241.3, 0), (0, 0, 270))):
            Circle(SKETCH2_R)
        with Locations(Location((12.7, -215.9, 0), (0, 0, 270))):
            Circle(SKETCH2_R)
    cut_extrude1 = extrude(amount=-CUT_EXTRUDE1_DEPTH, mode=Mode.SUBTRACT)

    # Sketch3 → Cut-Extrude2 (cut, through all)
    with BuildSketch(Plane.ZY):
        with Locations(Location((266.7, 12.7, 0), (0, 0, 270))):
            Circle(SKETCH3_R)
        with Locations(Location((241.3, 12.7, 0), (0, 0, 270))):
            Circle(SKETCH3_R)
        with Locations(Location((215.9, 12.7, 0), (0, 0, 270))):
            Circle(SKETCH3_R)
    cut_extrude2 = extrude(amount=-CUT_EXTRUDE2_DEPTH, mode=Mode.SUBTRACT)

    # Mirror1: Cut-Extrude1, Cut-Extrude2 across plane
    add(cut_extrude1.mirror(Plane.XY), mode=Mode.SUBTRACT)
    add(cut_extrude2.mirror(Plane.XY), mode=Mode.SUBTRACT)


solid = part.part
